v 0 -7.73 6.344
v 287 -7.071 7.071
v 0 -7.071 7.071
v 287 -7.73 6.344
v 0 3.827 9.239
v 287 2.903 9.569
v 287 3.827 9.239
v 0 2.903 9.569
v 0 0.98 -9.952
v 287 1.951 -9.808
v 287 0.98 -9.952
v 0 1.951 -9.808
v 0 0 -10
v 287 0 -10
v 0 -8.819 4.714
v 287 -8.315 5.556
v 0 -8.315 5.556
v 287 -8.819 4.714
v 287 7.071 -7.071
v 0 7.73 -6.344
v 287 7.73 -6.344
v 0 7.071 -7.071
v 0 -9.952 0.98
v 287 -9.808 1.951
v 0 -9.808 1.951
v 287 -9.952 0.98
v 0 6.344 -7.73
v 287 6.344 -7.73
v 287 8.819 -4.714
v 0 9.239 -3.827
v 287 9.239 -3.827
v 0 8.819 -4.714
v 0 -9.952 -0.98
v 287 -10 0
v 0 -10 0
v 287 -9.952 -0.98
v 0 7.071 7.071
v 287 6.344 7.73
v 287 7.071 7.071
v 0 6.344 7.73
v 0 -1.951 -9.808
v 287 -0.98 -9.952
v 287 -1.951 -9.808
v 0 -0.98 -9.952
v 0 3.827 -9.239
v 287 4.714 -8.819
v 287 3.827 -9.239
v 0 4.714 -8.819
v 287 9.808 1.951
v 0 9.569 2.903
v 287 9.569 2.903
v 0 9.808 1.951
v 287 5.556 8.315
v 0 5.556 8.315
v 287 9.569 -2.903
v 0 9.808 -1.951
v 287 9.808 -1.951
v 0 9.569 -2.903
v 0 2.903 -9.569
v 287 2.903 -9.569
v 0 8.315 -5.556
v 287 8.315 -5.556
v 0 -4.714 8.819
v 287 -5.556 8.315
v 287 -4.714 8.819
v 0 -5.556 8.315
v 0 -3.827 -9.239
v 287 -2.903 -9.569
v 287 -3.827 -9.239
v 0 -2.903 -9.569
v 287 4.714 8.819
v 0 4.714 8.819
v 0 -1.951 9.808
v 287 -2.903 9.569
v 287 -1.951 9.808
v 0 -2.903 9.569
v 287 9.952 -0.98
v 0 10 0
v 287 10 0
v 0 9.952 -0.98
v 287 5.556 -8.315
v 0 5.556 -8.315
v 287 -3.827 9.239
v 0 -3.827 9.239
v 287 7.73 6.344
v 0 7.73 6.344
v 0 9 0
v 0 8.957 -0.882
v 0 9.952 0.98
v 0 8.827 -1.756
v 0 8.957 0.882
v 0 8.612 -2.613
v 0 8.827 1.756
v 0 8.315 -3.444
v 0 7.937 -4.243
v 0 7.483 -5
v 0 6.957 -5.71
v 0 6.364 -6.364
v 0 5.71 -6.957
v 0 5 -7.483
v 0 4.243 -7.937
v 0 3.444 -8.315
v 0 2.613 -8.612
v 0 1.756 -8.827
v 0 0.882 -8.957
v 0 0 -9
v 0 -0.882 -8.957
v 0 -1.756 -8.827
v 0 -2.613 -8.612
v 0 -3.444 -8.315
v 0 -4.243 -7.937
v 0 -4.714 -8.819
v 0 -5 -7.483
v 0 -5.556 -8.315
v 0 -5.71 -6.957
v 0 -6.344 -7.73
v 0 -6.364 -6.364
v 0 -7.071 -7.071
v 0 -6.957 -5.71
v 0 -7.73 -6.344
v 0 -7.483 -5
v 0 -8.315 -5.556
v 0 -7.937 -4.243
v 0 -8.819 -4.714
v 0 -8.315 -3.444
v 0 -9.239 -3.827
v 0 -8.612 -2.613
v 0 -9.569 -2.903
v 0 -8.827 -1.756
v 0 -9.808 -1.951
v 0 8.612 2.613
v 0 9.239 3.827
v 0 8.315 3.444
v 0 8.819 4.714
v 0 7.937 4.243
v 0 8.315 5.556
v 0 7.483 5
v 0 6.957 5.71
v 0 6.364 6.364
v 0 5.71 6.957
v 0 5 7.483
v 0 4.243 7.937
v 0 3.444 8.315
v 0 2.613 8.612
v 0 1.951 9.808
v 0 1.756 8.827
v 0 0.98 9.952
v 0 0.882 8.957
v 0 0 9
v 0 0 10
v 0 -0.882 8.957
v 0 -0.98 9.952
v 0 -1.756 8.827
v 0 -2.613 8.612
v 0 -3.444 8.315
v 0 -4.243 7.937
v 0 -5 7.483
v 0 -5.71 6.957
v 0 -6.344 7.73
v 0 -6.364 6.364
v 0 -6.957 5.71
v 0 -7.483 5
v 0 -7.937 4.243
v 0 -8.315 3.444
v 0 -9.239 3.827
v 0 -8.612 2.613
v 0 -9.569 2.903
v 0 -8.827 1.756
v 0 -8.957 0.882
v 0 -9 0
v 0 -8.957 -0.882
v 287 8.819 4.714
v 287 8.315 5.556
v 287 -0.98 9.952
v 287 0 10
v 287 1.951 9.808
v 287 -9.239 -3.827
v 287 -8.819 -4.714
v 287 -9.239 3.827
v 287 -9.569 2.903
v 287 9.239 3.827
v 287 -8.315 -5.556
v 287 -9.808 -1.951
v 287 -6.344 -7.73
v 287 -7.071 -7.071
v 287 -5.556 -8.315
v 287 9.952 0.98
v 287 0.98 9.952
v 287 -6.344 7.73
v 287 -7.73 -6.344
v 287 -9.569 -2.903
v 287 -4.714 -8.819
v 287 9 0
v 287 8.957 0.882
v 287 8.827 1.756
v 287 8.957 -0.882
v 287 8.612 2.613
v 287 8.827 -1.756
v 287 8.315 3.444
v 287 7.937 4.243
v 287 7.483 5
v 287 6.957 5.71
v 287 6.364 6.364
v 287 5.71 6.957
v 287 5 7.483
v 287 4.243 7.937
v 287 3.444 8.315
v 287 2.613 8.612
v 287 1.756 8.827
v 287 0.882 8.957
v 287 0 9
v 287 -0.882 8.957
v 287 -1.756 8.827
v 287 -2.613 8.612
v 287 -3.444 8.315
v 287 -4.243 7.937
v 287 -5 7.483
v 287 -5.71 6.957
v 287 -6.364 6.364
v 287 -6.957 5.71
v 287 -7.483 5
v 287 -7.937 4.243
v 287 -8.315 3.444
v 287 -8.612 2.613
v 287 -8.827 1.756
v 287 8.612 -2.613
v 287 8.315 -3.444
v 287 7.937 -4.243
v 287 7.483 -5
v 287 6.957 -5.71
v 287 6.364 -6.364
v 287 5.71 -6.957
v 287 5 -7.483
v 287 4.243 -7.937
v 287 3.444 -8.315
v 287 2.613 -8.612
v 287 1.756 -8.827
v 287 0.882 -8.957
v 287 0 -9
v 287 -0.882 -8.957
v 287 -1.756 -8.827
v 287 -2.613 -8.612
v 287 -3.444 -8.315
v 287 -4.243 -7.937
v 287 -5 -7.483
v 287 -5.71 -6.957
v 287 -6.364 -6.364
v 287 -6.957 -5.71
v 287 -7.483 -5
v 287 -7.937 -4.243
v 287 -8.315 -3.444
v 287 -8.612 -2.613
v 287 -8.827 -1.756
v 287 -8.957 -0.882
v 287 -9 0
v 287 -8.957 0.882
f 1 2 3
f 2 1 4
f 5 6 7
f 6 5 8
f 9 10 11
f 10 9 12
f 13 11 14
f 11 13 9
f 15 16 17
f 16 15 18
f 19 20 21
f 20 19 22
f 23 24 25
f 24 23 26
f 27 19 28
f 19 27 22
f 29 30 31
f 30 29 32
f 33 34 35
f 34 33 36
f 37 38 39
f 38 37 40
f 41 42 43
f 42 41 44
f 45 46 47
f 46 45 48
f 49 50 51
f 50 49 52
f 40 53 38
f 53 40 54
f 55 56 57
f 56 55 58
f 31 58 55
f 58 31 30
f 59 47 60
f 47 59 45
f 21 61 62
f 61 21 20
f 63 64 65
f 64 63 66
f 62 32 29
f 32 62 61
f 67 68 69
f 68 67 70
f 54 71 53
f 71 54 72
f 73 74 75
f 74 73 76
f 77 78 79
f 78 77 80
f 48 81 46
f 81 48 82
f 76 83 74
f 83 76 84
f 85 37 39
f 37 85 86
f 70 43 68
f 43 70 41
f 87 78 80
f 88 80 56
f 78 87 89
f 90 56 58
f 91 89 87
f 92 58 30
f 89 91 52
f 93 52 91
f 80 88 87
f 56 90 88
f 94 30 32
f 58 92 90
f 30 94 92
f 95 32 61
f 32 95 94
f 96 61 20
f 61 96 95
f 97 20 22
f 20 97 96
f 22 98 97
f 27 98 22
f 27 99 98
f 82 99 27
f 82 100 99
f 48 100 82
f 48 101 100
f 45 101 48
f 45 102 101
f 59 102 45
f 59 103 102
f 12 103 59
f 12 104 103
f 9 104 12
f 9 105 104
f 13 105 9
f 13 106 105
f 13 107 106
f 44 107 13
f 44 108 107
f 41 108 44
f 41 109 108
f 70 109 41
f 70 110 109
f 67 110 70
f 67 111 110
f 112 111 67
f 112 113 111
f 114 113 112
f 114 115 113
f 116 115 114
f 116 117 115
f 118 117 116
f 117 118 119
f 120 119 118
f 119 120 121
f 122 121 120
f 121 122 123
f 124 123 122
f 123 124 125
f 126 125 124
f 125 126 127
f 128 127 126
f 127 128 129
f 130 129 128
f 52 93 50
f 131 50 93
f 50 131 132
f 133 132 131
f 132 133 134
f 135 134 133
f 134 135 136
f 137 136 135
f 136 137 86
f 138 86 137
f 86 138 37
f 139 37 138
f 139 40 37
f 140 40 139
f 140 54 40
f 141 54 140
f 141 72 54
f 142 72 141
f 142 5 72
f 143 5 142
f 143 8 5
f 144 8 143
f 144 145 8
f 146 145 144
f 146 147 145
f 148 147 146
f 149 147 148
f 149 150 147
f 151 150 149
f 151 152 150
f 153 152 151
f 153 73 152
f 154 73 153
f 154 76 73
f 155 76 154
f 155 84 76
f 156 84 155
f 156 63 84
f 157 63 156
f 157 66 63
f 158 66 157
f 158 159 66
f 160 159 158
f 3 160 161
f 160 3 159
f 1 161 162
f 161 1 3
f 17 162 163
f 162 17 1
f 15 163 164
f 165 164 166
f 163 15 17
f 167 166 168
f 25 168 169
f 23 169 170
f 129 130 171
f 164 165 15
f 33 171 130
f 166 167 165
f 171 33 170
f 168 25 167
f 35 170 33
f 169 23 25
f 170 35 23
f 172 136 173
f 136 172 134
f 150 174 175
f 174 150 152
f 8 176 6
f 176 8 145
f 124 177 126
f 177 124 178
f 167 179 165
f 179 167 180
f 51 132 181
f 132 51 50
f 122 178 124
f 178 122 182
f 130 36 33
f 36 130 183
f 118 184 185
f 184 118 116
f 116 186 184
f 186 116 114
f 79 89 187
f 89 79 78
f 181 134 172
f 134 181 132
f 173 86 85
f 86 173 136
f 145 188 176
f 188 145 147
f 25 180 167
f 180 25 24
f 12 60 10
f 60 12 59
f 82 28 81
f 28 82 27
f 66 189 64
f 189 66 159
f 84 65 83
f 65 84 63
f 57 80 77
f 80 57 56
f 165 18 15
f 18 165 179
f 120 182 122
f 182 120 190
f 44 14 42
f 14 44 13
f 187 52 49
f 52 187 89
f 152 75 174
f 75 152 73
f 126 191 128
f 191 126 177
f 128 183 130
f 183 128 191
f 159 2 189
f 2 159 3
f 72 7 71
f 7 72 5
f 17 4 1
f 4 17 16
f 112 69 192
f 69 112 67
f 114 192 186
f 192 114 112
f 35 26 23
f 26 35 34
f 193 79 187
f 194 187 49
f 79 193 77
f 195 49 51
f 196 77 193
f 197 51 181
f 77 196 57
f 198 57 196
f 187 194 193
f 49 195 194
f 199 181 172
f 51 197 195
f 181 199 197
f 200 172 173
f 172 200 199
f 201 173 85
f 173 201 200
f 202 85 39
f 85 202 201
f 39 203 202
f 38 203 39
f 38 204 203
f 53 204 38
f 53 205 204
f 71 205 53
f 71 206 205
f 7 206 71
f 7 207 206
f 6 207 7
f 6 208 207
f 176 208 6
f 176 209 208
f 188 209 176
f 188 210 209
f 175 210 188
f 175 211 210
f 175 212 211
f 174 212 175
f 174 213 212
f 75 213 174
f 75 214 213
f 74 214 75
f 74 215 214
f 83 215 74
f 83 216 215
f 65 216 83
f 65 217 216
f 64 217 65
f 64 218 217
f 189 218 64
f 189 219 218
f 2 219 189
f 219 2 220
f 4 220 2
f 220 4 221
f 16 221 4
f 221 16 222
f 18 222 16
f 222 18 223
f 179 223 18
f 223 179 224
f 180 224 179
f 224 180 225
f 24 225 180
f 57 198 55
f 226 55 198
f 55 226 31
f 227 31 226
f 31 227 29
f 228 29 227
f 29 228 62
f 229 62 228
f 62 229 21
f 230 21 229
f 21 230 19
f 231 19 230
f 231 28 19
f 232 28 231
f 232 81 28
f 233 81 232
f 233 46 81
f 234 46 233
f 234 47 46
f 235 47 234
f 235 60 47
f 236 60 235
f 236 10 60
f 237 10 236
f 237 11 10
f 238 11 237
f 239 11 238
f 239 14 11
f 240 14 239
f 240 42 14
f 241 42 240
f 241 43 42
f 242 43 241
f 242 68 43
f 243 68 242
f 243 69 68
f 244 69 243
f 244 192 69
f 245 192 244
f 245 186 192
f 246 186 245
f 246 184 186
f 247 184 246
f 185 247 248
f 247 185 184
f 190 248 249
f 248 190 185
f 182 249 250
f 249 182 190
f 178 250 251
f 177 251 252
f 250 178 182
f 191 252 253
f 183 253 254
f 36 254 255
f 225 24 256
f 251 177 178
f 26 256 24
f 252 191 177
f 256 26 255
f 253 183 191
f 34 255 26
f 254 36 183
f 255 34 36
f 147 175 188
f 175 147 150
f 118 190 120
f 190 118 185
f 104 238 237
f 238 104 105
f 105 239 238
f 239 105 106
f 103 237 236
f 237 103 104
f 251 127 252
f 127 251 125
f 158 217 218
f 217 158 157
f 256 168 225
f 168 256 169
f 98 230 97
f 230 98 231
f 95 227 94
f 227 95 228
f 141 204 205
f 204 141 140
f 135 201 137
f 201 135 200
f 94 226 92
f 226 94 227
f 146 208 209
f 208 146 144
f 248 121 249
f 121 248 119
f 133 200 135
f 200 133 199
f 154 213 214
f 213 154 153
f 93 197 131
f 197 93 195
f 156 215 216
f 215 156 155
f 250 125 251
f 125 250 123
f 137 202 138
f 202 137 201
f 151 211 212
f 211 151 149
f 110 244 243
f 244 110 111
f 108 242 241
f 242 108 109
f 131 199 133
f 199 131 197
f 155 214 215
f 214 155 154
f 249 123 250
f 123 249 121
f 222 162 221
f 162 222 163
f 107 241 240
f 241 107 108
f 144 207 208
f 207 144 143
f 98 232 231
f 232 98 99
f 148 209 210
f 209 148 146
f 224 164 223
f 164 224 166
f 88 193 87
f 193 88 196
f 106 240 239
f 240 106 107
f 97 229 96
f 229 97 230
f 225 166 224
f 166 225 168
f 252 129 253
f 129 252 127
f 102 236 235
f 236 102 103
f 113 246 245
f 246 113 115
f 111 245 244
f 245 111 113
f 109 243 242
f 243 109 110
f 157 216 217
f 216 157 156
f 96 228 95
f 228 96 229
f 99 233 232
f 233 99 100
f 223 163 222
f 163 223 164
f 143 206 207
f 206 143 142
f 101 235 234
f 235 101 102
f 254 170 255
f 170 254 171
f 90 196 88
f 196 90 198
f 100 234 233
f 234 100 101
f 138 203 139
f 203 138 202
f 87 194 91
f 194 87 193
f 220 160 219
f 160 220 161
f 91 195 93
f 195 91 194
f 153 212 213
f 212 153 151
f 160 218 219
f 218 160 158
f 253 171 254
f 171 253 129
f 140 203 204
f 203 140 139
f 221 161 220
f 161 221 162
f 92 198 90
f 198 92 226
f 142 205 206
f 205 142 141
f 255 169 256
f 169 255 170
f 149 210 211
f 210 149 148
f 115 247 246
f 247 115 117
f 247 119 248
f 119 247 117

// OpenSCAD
// file: ../common/ds_lib.scad
// DronSwarm · librería común de piezas del frame (S07-S08). Unidades: mm.
//
// Reglas (ADR-003): sin hull()/minkowski()/offset() — FreeCAD los convierte en malla y el STEP deja de ser un
// sólido válido. Las formas redondeadas se arman con uniones de cubos y cilindros. El importador CSG de FreeCAD
// también falla con booleanas 2D y con varios operandos agrupados bajo una sola transformación: cada grupo de
// agujeros debe ser hijo directo del difference(), con su propio translate.
//
// Interfaz de motor DronSwarm (DMI, ADR-011): placa con 4 ranuras radiales a 90°, de modo que el mismo soporte
// acepta varios patrones comerciales y, más adelante, el motor propio (S17+) se diseña para caer en el mismo rango.
//   DMI-S: 4×M3, círculo de tornillos Ø16-Ø25 (motores 28xx-41xx, ≤ 600 W)
//   DMI-L: 4×M4, círculo de tornillos Ø30-Ø42 (motores 50xx-70xx, ≤ 2 kW)

$fn = 48;

M3 = 3.3; M3_HEAD = 6.0; M3_NUT = 6.4;     // pasante, cabeza, tuerca (entre caras + juego)
M4 = 4.4; M4_HEAD = 7.5;
M5 = 5.4;

function dmi_bolt(iface) = iface == "L" ? M4 : M3;
function dmi_r(iface) = iface == "L" ? [15, 21] : [8, 12.5];   // radio mínimo y máximo de las ranuras
function dmi_plate_d(iface) = iface == "L" ? 56 : 36;
function dmi_center(iface) = iface == "L" ? 16 : 10;            // eje, seguro y paso de cables

// Rectángulo con esquinas redondeadas (2D) y su extrusión
module rrect2d(size, r) {
    r2 = min(r, size[0] / 2 - 0.01, size[1] / 2 - 0.01);
    union() {
        translate([r2, 0]) square([size[0] - 2 * r2, size[1]]);
        translate([0, r2]) square([size[0], size[1] - 2 * r2]);
        for (x = [r2, size[0] - r2], y = [r2, size[1] - r2]) translate([x, y]) circle(r = r2);
    }
}
// Caja redondeada con primitivas 3D (sin booleanas 2D: el importador CSG de FreeCAD falla con ellas)
module rbox(size, r) {
    r2 = min(r, size[0] / 2 - 0.01, size[1] / 2 - 0.01);
    union() {
        translate([r2, 0, 0]) cube([size[0] - 2 * r2, size[1], size[2]]);
        translate([0, r2, 0]) cube([size[0], size[1] - 2 * r2, size[2]]);
        for (x = [r2, size[0] - r2], y = [r2, size[1] - r2]) translate([x, y, 0]) cylinder(r = r2, h = size[2]);
    }
}
module crbox(size, r) { translate([-size[0] / 2, -size[1] / 2, 0]) rbox(size, r); }   // centrado en x/y

// Ranura (2D) entre dos puntos sobre el eje x
module slot2d(r0, r1, w) {
    union() {
        translate([r0, -w / 2]) square([r1 - r0, w]);
        translate([r0, 0]) circle(d = w);
        translate([r1, 0]) circle(d = w);
    }
}

// Agujeros de la interfaz de motor (para restar de una placa de espesor t)
module slot3d(r0, r1, w, h) {
    union() {
        translate([r0, -w / 2, 0]) cube([r1 - r0, w, h]);
        translate([r0, 0, 0]) cylinder(d = w, h = h);
        translate([r1, 0, 0]) cylinder(d = w, h = h);
    }
}
module dmi_holes(iface, t) {
    r = dmi_r(iface);
    translate([0, 0, -1]) union() {
        cylinder(d = dmi_center(iface), h = t + 2);
        for (a = [45, 135, 225, 315]) rotate(a) slot3d(r[0], r[1], dmi_bolt(iface), t + 2);
    }
}

// Soporte de motor en la punta del brazo: manguito sobre el tubo + placa DMI arriba
//   el tubo entra por -x; la placa queda centrada en el eje del motor (origen), cara superior en z = 0
module motor_mount(tube_d, iface = "S", sleeve = 34, wall = 3.5) {
    od = tube_d + 2 * wall;
    pd = dmi_plate_d(iface);
    pt = iface == "L" ? 6 : 4;
    zc = -pt - tube_d / 2 - 1;                 // eje del tubo bajo la placa
    difference() {
        union() {
            translate([0, 0, -pt]) cylinder(d = pd, h = pt);                         // placa DMI
            translate([-sleeve - pd / 2 + 6, 0, zc]) rotate([0, 90, 0])
                cylinder(d = od, h = sleeve + pd / 2 - 6 + 4);                       // manguito
            translate([-sleeve - pd / 2 + 6, -od / 2, zc]) cube([sleeve + pd / 2 - 2, od, -zc - pt + 0.01]);  // alma
            translate([-sleeve - pd / 2 + 6, -5, zc - od / 2 - 7]) cube([sleeve, 10, 8]);   // oreja de apriete
        }
        dmi_holes(iface, pt + 0.02, $fn = 32);
        translate([-sleeve - pd / 2 + 5, 0, zc]) rotate([0, 90, 0]) cylinder(d = tube_d + 0.3, h = sleeve + pd / 2 - 3); // tubo
        translate([-sleeve - pd / 2 + 4, -1, zc - od / 2 - 8]) cube([sleeve + 1, 2, od / 2 + 6]);   // ranura de apriete
        for (x = [0.3, 0.75]) translate([-sleeve - pd / 2 + 6 + x * sleeve, 0, zc - od / 2 - 3])
            rotate([90, 0, 0]) cylinder(d = M3, h = 30, center = true);                // tornillos de apriete
        translate([-pd / 2 - 2, 0, zc]) rotate([0, 90, 0]) cylinder(d = 7, h = pd);   // salida de cables del tubo
    }
}

// Bloque de brazo entre las dos placas centrales (impreso PA12-CF): sujeta el tubo y separa las placas.
//   el tubo sale por +x desde el origen; el bloque ocupa x ∈ [-len, 0], altura = gap
module arm_block(tube_d, gap, len = 40, width = 0, bolt = M3) {
    w = width > 0 ? width : tube_d + 14;
    difference() {
        translate([-len, -w / 2, 0]) rbox([len, w, gap], 2);
        translate([-len - 1, 0, gap / 2]) rotate([0, 90, 0]) cylinder(d = tube_d + 0.2, h = len + 2);   // tubo
        translate([-len - 1, -0.75, gap / 2]) cube([len + 2, 1.5, gap / 2 + 1]);                        // ranura de apriete
        for (p = arm_block_bolts(tube_d, len, w)) translate([p[0], p[1], -1]) cylinder(d = bolt, h = gap + 2);
        translate([-len * 0.5, 0, gap * 0.78]) rotate([90, 0, 0]) cylinder(d = M3, h = w + 2, center = true);  // apriete
    }
}
function arm_block_bolts(tube_d, len, w) =
    [for (x = [-len + 6, -6], y = [-(w / 2 - 3.6), w / 2 - 3.6]) [x, y]];

// Patrón de controladora de vuelo (agujeros M3 en cuadrado)
module fc_holes(pattern, t) {
    for (x = [-1, 1], y = [-1, 1]) translate([x * pattern / 2, y * pattern / 2, -1]) cylinder(d = M3, h = t + 2);
}
// file: ds_i_params.scad
// DS-I · parámetros generados por tools/cad/gen_cad_params.py el 2026-10-19
// desde engineering/data/results (spec v1). No editar a mano: regenerar. Unidades: mm, kg.

vehicle = "DS-I";
rotors = 4;
wheelbase = 672;
arm_radius = 336;
prop_d = 431.8;
tube_od = 20;
tube_wall = 1;
arm_len = 252;
plate_d = 168;
plate_t = 3;
plate_gap = 26;
motor_iface = "S";
battery_dims = [134.4, 76.2, 48.8];
battery = "6S2P 50S";
leg_h = 160;
fold_arms = false;
mtow_kg = 2.695;
motor_mass_kg = 0.074;
fc_pattern = 30.5;
gimbal_box = [90, 70, 105];
gimbal_damper_pitch = [60, 50];
// file: ds_i_frame.scad
// DS-I · geometría compartida del frame: posiciones derivadas de los parámetros (spec v1). Unidades: mm.
// Ejes: x adelante, y izquierda, z arriba. z = 0 es la cara superior de la placa inferior.
// Cada pieza vive en su propio archivo (center_plate.scad, arm_block.scad, …) e incluye este.

include <ds_i_params.scad>
use <../common/ds_lib.scad>
include <../common/ds_lib.scad>

arm_angles = [45, 135, 225, 315];         // quad X
block_len = 40;
block_w = tube_od + 14;
r_block_out = plate_d / 2 - 3;            // extremo exterior del bloque de brazo
tube_z = plate_gap / 2;                   // eje de los tubos
tube_len = arm_radius - r_block_out + block_len - 8;   // dentro del bloque hasta el soporte de motor
leg_offset = 70;                          // patas abrazadas al brazo, a esta distancia del bloque
leg_r = r_block_out + leg_offset;
leg_tube = 12;                            // tubo de las patas Ø12×1
battery_pos = [-28, 0];                   // batería transversal, atrás, bajo la placa
gimbal_pos = [62, 0];                     // cámara adelante, colgada con amortiguadores
housing_size = [120, 90, 58];             // carcasa IP54 sobre la placa superior
housing_pos = [0, 0];

// Contorno de las placas centrales (2D): círculo con lóbulos bajo cada bloque de brazo
module plate_outline() {
    union() {
        circle(d = plate_d, $fn = 96);
        for (a = arm_angles) rotate(a) translate([r_block_out - block_len - 4, -block_w / 2 - 4]) square([block_len + 7, block_w + 8]);
    }
}

// Agujeros comunes a ambas placas: tornillos de los bloques
module plate_common_holes() {
    for (a = arm_angles) rotate(a) translate([r_block_out, 0])
        for (p = arm_block_bolts(tube_od, block_len, block_w)) translate(p) circle(d = M3);
}

// Posiciones de piezas montadas en las placas
gimbal_mount_bolts = [for (x = [-25, 25], y = [-32, 32]) [gimbal_pos[0] - 15 + x, y]];   // adaptador bajo la placa
battery_tray_bolts = [for (x = [-30, 30], y = [-46, 46]) [battery_pos[0] + x, y]];
housing_flange = 10;
// tornillos de la brida a 6 mm de la pared (afuera del canal de la junta, que va de 0.6 a 2.6 mm)
housing_bolts = [[66, 0], [-66, 0], [0, 51], [0, -51], [40, 51], [40, -51], [-40, 51], [-40, -51]];
cable_gland_pos = [-housing_size[0] / 2 + 18, 0];      // paso de cables al interior de la carcasa (prensaestopa M12)
motor_d = motor_iface == "L" ? 62 : 38;   // motor de referencia (COTS, se confirma en S09)
motor_h = motor_iface == "L" ? 36 : 26;
tray_t = 3;                               // bandeja de batería
gm_t = 4;                                 // placas del adaptador de cámara
damper_h = 10;                            // amortiguadores de silicona
foot_h = 45;                              // pie amortiguador de TPU (≈ 30 mm de carrera)
foot_stroke = 30;
// Altura de las patas por condición de diseño: con el pie comprimido, la cámara no toca el suelo (10 mm de margen)
gimbal_bottom_z = -plate_t - 2 * gm_t - damper_h - gimbal_box[2];
ground_z = gimbal_bottom_z - foot_stroke - 10;
leg_top_z = tube_z - (tube_od + 8) / 2 - 2;     // tope del tubo de la pata dentro de la abrazadera
leg_len = (leg_top_z - ground_z) - (foot_h - 12);
mm_sleeve = 26;                           // manguito del soporte de motor (FEA: FS 37 con 34 mm, se acorta)
// main file
// DS-I · brazo: tubo de carbono enrollado (compra, corte a medida, ×4). Local: eje x, desde x = 0.
include <ds_i_frame.scad>
module arm_tube() rotate([0, 90, 0]) difference() {
    cylinder(d = tube_od, h = tube_len, $fn = 64);
    translate([0, 0, -1]) cylinder(d = tube_od - 2 * tube_wall, h = tube_len + 2, $fn = 64);
}
arm_tube();
